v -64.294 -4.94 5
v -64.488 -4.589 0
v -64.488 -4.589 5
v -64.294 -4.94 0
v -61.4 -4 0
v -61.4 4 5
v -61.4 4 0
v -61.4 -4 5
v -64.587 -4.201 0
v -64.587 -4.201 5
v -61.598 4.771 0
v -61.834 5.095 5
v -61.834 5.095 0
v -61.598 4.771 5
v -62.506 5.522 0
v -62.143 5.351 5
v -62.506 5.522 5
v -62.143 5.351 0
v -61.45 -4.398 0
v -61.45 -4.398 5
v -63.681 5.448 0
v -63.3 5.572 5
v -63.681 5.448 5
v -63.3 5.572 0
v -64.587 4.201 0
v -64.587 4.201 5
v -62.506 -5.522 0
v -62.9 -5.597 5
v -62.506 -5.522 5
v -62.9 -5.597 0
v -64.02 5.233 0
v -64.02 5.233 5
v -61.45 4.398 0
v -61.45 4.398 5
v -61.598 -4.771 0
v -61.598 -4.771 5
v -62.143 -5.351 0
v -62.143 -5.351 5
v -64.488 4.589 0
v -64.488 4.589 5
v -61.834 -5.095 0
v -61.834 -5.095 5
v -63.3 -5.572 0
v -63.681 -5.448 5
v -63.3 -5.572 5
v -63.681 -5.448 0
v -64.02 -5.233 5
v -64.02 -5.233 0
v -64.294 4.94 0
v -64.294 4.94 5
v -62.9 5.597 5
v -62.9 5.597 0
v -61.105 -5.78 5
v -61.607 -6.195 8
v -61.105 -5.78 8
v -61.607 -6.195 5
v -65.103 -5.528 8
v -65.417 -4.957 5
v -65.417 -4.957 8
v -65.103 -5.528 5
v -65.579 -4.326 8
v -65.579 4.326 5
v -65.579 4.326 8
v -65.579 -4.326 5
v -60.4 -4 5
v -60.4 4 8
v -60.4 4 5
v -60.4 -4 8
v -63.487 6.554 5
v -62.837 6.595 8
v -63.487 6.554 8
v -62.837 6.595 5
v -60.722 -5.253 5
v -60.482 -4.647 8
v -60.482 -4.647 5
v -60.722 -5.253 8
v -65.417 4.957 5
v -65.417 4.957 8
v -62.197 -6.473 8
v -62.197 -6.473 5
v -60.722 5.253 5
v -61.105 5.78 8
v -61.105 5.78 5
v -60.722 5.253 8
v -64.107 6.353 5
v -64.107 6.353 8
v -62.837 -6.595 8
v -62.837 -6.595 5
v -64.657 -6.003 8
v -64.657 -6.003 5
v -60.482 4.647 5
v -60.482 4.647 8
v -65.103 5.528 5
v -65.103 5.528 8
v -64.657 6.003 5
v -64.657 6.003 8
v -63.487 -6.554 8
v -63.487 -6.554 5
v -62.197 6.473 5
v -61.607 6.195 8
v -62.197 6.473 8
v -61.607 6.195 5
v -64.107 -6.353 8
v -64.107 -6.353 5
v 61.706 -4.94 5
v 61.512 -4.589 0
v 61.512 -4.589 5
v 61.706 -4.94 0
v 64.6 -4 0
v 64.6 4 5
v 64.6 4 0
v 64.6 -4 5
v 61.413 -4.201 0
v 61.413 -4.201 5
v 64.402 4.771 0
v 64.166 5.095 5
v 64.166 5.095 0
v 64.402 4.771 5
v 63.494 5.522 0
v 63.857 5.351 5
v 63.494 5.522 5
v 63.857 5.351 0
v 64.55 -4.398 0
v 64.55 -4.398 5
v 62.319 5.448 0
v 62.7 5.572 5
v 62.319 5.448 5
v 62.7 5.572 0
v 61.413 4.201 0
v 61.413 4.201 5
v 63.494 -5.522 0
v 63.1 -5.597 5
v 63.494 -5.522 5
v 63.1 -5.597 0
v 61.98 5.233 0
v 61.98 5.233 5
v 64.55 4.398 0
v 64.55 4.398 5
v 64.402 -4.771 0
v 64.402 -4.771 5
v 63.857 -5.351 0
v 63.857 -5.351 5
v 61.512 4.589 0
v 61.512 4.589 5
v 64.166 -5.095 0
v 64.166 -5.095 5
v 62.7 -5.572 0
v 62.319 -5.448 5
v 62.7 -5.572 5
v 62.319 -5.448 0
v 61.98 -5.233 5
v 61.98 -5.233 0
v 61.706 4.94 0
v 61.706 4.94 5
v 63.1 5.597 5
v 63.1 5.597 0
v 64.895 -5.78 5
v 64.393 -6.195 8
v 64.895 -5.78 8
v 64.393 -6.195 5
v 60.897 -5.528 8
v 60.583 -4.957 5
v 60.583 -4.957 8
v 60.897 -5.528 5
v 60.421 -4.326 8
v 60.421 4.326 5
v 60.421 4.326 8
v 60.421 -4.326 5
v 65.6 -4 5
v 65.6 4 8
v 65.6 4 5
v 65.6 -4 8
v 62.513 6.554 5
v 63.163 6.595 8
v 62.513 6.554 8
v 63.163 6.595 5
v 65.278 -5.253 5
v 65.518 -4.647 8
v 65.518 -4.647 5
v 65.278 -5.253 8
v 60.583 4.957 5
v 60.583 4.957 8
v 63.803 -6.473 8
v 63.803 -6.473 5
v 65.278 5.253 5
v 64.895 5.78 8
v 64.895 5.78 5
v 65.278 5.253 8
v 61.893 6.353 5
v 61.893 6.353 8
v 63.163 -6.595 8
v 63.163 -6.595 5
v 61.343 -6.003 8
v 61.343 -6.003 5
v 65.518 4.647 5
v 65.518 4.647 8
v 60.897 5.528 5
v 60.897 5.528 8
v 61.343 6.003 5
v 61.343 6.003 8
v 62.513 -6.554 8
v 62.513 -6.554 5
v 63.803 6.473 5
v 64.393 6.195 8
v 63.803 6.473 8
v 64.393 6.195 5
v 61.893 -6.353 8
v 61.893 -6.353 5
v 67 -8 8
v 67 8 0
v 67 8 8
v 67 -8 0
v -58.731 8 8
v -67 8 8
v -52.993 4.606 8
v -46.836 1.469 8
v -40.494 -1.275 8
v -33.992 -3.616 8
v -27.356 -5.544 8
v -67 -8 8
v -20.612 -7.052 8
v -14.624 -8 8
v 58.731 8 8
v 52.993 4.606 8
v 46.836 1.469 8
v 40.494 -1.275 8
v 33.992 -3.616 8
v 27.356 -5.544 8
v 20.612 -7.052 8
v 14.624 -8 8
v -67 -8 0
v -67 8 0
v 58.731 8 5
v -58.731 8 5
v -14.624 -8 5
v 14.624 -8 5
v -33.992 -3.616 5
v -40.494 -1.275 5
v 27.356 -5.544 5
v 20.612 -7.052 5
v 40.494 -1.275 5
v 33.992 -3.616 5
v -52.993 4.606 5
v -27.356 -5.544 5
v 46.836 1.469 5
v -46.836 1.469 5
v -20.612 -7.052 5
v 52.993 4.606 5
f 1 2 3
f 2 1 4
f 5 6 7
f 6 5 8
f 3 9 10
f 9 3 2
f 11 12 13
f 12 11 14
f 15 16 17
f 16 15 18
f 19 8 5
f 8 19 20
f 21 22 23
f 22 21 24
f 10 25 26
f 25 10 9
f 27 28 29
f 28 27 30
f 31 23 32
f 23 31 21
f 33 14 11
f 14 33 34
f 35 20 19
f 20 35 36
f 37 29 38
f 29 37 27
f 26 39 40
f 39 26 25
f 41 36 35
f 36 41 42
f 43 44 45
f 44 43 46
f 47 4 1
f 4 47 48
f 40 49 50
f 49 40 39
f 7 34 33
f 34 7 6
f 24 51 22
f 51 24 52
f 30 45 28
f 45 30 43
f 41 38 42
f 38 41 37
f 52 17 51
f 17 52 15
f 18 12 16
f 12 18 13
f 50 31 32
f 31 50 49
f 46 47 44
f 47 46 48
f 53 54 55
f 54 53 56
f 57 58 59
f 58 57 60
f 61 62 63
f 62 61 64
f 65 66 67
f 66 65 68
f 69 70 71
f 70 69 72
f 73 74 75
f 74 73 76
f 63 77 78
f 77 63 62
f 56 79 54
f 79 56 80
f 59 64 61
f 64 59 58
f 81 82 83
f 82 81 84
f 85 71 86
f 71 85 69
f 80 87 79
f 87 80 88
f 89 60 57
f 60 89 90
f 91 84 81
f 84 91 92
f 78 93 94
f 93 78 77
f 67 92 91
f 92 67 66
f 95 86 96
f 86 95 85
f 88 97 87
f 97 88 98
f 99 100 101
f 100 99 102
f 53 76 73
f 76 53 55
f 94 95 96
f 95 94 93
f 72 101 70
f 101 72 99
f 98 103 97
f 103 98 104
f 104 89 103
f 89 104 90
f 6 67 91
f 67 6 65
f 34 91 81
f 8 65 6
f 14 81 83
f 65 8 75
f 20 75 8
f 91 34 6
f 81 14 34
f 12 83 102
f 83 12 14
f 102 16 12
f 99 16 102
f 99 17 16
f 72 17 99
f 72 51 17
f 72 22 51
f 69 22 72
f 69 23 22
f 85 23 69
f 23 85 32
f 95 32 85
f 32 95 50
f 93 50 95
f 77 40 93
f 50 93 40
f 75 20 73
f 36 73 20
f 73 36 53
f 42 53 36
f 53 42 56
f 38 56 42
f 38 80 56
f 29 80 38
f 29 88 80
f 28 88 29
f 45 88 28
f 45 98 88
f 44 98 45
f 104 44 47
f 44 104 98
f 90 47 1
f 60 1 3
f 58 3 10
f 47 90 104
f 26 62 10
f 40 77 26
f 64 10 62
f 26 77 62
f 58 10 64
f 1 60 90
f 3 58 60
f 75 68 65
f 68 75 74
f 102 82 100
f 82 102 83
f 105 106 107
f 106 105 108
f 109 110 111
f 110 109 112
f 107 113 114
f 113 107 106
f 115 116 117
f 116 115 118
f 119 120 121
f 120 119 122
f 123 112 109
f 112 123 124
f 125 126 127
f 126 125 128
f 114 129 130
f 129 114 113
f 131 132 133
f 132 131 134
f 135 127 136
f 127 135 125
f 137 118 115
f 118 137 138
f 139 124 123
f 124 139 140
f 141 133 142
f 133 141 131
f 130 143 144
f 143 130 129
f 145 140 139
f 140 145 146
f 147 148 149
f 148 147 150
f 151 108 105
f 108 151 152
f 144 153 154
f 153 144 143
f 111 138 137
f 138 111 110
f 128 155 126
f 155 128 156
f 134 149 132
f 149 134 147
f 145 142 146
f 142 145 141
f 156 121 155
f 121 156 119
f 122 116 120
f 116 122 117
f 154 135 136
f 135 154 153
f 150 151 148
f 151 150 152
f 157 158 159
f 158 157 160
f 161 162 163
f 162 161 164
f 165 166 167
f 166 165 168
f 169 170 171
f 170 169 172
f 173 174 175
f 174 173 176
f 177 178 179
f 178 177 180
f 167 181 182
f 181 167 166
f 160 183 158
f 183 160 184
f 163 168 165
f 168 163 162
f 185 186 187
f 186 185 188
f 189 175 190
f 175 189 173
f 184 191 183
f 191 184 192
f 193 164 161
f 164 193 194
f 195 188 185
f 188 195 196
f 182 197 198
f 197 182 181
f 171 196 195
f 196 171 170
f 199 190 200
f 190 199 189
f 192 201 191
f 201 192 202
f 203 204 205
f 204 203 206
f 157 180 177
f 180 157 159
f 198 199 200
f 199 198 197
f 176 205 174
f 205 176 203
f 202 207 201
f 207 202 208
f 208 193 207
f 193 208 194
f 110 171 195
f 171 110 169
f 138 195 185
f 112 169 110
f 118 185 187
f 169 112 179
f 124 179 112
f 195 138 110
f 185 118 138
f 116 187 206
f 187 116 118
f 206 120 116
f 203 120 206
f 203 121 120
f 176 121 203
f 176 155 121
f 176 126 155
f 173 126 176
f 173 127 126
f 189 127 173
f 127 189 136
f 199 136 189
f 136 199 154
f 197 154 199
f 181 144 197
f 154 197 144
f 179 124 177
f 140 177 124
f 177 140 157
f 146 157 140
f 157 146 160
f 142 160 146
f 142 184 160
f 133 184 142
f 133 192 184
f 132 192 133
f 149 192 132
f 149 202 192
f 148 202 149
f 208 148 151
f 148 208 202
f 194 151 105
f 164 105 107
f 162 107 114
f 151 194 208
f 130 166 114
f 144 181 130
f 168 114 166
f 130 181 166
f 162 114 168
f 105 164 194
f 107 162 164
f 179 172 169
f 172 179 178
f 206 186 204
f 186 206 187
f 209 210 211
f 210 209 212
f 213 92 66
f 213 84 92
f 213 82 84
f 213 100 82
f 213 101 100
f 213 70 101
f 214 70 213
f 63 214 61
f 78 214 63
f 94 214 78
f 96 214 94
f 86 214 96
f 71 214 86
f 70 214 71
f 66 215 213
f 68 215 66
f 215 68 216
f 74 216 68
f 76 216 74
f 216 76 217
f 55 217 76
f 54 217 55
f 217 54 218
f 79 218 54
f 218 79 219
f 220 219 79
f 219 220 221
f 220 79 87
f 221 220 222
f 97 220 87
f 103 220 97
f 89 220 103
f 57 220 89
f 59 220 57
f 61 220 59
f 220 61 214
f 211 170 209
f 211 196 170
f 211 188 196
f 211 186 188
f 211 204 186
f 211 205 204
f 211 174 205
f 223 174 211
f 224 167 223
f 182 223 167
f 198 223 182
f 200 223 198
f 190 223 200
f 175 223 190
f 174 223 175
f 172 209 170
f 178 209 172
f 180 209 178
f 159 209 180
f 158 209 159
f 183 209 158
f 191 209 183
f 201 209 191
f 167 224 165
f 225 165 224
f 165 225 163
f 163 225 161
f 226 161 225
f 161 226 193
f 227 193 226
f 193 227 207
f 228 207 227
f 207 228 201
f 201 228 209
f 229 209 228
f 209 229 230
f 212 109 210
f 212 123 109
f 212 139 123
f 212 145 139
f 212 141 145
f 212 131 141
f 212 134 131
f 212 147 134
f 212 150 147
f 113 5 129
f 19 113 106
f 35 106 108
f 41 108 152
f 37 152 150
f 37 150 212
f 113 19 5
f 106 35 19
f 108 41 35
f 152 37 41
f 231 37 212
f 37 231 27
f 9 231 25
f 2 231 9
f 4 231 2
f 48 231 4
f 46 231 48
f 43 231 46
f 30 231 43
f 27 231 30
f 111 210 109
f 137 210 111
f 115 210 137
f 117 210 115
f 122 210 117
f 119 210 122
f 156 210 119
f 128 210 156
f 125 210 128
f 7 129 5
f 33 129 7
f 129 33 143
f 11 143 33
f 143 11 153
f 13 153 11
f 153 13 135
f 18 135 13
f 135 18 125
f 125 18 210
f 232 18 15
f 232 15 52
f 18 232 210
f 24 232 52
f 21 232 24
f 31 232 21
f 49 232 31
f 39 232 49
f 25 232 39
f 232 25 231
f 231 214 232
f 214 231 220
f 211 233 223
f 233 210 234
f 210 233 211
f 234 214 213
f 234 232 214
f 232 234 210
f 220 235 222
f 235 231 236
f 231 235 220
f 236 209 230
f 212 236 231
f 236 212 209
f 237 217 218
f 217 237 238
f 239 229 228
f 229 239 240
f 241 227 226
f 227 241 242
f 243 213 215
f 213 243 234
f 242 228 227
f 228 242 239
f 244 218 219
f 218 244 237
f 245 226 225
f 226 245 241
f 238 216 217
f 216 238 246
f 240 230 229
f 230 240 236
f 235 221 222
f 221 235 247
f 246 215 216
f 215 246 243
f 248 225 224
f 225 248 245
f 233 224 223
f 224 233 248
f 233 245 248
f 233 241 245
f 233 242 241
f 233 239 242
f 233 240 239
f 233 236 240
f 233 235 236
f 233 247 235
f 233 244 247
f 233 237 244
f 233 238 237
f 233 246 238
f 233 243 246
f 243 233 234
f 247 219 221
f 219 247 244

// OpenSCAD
BED_HEIGHT = 3;
BED_DIAMETER = 220;
OVERHANG = 1;

WIDTH = 16;
LENGTH = 134;
HEIGHT = 5 + BED_HEIGHT;

BOLT_DIAMETER = 3.2;
BOLT_HEAD_DIAMETER = 5.2;
BOLT_SHAFT_LENGTH = 5;
SLOT_LENGTH = 8;
BOLT_OFFSET = 4;

difference() {
    translate([-LENGTH/2, -WIDTH/2, 0])
    cube(
        size = [LENGTH, WIDTH, HEIGHT]
    );

    translate([
        0, 
        BED_DIAMETER/2 - WIDTH/2 - OVERHANG, 
        HEIGHT - BED_HEIGHT
    ])
    cylinder(
        r = BED_DIAMETER/2, 
        h = 2*BED_HEIGHT, 
        $fn = 100
    );

    translate([
        -LENGTH/2 + BOLT_OFFSET, 
        0, 
        -1
    ])
    BoltSlot(
        BOLT_DIAMETER,
        BOLT_SHAFT_LENGTH + 1, 
        BOLT_HEAD_DIAMETER, 
        HEIGHT - BOLT_SHAFT_LENGTH + 2, 
        SLOT_LENGTH
    );
    
    translate([
        LENGTH/2 - BOLT_OFFSET, 
        0, 
        -1
    ])
    BoltSlot(
        BOLT_DIAMETER,
        BOLT_SHAFT_LENGTH + 1, 
        BOLT_HEAD_DIAMETER, 
        HEIGHT - BOLT_SHAFT_LENGTH + 2, 
        SLOT_LENGTH
    );
}

module Slot(
    diameter,
    height,
    width
) {
    linear_extrude(height = height)
    hull() {
        translate([0, -width/2, 0])
        circle(
            r = diameter/2, 
            $fn = 25
        );

        translate([0, width/2, 0])
        circle(
            r = diameter/2, 
            $fn = 25
        );
    }
    
}

module BoltSlot(
    shaftDiameter, 
    shaftLength, 
    headDiameter, 
    headLength, 
    slotWidth
) {
    union() {
        Slot(
            shaftDiameter, 
            shaftLength + headLength, 
            slotWidth
        );

        translate([0, 0, shaftLength])
        Slot(
            headDiameter, 
            headLength, 
            slotWidth
        );
    }
}
